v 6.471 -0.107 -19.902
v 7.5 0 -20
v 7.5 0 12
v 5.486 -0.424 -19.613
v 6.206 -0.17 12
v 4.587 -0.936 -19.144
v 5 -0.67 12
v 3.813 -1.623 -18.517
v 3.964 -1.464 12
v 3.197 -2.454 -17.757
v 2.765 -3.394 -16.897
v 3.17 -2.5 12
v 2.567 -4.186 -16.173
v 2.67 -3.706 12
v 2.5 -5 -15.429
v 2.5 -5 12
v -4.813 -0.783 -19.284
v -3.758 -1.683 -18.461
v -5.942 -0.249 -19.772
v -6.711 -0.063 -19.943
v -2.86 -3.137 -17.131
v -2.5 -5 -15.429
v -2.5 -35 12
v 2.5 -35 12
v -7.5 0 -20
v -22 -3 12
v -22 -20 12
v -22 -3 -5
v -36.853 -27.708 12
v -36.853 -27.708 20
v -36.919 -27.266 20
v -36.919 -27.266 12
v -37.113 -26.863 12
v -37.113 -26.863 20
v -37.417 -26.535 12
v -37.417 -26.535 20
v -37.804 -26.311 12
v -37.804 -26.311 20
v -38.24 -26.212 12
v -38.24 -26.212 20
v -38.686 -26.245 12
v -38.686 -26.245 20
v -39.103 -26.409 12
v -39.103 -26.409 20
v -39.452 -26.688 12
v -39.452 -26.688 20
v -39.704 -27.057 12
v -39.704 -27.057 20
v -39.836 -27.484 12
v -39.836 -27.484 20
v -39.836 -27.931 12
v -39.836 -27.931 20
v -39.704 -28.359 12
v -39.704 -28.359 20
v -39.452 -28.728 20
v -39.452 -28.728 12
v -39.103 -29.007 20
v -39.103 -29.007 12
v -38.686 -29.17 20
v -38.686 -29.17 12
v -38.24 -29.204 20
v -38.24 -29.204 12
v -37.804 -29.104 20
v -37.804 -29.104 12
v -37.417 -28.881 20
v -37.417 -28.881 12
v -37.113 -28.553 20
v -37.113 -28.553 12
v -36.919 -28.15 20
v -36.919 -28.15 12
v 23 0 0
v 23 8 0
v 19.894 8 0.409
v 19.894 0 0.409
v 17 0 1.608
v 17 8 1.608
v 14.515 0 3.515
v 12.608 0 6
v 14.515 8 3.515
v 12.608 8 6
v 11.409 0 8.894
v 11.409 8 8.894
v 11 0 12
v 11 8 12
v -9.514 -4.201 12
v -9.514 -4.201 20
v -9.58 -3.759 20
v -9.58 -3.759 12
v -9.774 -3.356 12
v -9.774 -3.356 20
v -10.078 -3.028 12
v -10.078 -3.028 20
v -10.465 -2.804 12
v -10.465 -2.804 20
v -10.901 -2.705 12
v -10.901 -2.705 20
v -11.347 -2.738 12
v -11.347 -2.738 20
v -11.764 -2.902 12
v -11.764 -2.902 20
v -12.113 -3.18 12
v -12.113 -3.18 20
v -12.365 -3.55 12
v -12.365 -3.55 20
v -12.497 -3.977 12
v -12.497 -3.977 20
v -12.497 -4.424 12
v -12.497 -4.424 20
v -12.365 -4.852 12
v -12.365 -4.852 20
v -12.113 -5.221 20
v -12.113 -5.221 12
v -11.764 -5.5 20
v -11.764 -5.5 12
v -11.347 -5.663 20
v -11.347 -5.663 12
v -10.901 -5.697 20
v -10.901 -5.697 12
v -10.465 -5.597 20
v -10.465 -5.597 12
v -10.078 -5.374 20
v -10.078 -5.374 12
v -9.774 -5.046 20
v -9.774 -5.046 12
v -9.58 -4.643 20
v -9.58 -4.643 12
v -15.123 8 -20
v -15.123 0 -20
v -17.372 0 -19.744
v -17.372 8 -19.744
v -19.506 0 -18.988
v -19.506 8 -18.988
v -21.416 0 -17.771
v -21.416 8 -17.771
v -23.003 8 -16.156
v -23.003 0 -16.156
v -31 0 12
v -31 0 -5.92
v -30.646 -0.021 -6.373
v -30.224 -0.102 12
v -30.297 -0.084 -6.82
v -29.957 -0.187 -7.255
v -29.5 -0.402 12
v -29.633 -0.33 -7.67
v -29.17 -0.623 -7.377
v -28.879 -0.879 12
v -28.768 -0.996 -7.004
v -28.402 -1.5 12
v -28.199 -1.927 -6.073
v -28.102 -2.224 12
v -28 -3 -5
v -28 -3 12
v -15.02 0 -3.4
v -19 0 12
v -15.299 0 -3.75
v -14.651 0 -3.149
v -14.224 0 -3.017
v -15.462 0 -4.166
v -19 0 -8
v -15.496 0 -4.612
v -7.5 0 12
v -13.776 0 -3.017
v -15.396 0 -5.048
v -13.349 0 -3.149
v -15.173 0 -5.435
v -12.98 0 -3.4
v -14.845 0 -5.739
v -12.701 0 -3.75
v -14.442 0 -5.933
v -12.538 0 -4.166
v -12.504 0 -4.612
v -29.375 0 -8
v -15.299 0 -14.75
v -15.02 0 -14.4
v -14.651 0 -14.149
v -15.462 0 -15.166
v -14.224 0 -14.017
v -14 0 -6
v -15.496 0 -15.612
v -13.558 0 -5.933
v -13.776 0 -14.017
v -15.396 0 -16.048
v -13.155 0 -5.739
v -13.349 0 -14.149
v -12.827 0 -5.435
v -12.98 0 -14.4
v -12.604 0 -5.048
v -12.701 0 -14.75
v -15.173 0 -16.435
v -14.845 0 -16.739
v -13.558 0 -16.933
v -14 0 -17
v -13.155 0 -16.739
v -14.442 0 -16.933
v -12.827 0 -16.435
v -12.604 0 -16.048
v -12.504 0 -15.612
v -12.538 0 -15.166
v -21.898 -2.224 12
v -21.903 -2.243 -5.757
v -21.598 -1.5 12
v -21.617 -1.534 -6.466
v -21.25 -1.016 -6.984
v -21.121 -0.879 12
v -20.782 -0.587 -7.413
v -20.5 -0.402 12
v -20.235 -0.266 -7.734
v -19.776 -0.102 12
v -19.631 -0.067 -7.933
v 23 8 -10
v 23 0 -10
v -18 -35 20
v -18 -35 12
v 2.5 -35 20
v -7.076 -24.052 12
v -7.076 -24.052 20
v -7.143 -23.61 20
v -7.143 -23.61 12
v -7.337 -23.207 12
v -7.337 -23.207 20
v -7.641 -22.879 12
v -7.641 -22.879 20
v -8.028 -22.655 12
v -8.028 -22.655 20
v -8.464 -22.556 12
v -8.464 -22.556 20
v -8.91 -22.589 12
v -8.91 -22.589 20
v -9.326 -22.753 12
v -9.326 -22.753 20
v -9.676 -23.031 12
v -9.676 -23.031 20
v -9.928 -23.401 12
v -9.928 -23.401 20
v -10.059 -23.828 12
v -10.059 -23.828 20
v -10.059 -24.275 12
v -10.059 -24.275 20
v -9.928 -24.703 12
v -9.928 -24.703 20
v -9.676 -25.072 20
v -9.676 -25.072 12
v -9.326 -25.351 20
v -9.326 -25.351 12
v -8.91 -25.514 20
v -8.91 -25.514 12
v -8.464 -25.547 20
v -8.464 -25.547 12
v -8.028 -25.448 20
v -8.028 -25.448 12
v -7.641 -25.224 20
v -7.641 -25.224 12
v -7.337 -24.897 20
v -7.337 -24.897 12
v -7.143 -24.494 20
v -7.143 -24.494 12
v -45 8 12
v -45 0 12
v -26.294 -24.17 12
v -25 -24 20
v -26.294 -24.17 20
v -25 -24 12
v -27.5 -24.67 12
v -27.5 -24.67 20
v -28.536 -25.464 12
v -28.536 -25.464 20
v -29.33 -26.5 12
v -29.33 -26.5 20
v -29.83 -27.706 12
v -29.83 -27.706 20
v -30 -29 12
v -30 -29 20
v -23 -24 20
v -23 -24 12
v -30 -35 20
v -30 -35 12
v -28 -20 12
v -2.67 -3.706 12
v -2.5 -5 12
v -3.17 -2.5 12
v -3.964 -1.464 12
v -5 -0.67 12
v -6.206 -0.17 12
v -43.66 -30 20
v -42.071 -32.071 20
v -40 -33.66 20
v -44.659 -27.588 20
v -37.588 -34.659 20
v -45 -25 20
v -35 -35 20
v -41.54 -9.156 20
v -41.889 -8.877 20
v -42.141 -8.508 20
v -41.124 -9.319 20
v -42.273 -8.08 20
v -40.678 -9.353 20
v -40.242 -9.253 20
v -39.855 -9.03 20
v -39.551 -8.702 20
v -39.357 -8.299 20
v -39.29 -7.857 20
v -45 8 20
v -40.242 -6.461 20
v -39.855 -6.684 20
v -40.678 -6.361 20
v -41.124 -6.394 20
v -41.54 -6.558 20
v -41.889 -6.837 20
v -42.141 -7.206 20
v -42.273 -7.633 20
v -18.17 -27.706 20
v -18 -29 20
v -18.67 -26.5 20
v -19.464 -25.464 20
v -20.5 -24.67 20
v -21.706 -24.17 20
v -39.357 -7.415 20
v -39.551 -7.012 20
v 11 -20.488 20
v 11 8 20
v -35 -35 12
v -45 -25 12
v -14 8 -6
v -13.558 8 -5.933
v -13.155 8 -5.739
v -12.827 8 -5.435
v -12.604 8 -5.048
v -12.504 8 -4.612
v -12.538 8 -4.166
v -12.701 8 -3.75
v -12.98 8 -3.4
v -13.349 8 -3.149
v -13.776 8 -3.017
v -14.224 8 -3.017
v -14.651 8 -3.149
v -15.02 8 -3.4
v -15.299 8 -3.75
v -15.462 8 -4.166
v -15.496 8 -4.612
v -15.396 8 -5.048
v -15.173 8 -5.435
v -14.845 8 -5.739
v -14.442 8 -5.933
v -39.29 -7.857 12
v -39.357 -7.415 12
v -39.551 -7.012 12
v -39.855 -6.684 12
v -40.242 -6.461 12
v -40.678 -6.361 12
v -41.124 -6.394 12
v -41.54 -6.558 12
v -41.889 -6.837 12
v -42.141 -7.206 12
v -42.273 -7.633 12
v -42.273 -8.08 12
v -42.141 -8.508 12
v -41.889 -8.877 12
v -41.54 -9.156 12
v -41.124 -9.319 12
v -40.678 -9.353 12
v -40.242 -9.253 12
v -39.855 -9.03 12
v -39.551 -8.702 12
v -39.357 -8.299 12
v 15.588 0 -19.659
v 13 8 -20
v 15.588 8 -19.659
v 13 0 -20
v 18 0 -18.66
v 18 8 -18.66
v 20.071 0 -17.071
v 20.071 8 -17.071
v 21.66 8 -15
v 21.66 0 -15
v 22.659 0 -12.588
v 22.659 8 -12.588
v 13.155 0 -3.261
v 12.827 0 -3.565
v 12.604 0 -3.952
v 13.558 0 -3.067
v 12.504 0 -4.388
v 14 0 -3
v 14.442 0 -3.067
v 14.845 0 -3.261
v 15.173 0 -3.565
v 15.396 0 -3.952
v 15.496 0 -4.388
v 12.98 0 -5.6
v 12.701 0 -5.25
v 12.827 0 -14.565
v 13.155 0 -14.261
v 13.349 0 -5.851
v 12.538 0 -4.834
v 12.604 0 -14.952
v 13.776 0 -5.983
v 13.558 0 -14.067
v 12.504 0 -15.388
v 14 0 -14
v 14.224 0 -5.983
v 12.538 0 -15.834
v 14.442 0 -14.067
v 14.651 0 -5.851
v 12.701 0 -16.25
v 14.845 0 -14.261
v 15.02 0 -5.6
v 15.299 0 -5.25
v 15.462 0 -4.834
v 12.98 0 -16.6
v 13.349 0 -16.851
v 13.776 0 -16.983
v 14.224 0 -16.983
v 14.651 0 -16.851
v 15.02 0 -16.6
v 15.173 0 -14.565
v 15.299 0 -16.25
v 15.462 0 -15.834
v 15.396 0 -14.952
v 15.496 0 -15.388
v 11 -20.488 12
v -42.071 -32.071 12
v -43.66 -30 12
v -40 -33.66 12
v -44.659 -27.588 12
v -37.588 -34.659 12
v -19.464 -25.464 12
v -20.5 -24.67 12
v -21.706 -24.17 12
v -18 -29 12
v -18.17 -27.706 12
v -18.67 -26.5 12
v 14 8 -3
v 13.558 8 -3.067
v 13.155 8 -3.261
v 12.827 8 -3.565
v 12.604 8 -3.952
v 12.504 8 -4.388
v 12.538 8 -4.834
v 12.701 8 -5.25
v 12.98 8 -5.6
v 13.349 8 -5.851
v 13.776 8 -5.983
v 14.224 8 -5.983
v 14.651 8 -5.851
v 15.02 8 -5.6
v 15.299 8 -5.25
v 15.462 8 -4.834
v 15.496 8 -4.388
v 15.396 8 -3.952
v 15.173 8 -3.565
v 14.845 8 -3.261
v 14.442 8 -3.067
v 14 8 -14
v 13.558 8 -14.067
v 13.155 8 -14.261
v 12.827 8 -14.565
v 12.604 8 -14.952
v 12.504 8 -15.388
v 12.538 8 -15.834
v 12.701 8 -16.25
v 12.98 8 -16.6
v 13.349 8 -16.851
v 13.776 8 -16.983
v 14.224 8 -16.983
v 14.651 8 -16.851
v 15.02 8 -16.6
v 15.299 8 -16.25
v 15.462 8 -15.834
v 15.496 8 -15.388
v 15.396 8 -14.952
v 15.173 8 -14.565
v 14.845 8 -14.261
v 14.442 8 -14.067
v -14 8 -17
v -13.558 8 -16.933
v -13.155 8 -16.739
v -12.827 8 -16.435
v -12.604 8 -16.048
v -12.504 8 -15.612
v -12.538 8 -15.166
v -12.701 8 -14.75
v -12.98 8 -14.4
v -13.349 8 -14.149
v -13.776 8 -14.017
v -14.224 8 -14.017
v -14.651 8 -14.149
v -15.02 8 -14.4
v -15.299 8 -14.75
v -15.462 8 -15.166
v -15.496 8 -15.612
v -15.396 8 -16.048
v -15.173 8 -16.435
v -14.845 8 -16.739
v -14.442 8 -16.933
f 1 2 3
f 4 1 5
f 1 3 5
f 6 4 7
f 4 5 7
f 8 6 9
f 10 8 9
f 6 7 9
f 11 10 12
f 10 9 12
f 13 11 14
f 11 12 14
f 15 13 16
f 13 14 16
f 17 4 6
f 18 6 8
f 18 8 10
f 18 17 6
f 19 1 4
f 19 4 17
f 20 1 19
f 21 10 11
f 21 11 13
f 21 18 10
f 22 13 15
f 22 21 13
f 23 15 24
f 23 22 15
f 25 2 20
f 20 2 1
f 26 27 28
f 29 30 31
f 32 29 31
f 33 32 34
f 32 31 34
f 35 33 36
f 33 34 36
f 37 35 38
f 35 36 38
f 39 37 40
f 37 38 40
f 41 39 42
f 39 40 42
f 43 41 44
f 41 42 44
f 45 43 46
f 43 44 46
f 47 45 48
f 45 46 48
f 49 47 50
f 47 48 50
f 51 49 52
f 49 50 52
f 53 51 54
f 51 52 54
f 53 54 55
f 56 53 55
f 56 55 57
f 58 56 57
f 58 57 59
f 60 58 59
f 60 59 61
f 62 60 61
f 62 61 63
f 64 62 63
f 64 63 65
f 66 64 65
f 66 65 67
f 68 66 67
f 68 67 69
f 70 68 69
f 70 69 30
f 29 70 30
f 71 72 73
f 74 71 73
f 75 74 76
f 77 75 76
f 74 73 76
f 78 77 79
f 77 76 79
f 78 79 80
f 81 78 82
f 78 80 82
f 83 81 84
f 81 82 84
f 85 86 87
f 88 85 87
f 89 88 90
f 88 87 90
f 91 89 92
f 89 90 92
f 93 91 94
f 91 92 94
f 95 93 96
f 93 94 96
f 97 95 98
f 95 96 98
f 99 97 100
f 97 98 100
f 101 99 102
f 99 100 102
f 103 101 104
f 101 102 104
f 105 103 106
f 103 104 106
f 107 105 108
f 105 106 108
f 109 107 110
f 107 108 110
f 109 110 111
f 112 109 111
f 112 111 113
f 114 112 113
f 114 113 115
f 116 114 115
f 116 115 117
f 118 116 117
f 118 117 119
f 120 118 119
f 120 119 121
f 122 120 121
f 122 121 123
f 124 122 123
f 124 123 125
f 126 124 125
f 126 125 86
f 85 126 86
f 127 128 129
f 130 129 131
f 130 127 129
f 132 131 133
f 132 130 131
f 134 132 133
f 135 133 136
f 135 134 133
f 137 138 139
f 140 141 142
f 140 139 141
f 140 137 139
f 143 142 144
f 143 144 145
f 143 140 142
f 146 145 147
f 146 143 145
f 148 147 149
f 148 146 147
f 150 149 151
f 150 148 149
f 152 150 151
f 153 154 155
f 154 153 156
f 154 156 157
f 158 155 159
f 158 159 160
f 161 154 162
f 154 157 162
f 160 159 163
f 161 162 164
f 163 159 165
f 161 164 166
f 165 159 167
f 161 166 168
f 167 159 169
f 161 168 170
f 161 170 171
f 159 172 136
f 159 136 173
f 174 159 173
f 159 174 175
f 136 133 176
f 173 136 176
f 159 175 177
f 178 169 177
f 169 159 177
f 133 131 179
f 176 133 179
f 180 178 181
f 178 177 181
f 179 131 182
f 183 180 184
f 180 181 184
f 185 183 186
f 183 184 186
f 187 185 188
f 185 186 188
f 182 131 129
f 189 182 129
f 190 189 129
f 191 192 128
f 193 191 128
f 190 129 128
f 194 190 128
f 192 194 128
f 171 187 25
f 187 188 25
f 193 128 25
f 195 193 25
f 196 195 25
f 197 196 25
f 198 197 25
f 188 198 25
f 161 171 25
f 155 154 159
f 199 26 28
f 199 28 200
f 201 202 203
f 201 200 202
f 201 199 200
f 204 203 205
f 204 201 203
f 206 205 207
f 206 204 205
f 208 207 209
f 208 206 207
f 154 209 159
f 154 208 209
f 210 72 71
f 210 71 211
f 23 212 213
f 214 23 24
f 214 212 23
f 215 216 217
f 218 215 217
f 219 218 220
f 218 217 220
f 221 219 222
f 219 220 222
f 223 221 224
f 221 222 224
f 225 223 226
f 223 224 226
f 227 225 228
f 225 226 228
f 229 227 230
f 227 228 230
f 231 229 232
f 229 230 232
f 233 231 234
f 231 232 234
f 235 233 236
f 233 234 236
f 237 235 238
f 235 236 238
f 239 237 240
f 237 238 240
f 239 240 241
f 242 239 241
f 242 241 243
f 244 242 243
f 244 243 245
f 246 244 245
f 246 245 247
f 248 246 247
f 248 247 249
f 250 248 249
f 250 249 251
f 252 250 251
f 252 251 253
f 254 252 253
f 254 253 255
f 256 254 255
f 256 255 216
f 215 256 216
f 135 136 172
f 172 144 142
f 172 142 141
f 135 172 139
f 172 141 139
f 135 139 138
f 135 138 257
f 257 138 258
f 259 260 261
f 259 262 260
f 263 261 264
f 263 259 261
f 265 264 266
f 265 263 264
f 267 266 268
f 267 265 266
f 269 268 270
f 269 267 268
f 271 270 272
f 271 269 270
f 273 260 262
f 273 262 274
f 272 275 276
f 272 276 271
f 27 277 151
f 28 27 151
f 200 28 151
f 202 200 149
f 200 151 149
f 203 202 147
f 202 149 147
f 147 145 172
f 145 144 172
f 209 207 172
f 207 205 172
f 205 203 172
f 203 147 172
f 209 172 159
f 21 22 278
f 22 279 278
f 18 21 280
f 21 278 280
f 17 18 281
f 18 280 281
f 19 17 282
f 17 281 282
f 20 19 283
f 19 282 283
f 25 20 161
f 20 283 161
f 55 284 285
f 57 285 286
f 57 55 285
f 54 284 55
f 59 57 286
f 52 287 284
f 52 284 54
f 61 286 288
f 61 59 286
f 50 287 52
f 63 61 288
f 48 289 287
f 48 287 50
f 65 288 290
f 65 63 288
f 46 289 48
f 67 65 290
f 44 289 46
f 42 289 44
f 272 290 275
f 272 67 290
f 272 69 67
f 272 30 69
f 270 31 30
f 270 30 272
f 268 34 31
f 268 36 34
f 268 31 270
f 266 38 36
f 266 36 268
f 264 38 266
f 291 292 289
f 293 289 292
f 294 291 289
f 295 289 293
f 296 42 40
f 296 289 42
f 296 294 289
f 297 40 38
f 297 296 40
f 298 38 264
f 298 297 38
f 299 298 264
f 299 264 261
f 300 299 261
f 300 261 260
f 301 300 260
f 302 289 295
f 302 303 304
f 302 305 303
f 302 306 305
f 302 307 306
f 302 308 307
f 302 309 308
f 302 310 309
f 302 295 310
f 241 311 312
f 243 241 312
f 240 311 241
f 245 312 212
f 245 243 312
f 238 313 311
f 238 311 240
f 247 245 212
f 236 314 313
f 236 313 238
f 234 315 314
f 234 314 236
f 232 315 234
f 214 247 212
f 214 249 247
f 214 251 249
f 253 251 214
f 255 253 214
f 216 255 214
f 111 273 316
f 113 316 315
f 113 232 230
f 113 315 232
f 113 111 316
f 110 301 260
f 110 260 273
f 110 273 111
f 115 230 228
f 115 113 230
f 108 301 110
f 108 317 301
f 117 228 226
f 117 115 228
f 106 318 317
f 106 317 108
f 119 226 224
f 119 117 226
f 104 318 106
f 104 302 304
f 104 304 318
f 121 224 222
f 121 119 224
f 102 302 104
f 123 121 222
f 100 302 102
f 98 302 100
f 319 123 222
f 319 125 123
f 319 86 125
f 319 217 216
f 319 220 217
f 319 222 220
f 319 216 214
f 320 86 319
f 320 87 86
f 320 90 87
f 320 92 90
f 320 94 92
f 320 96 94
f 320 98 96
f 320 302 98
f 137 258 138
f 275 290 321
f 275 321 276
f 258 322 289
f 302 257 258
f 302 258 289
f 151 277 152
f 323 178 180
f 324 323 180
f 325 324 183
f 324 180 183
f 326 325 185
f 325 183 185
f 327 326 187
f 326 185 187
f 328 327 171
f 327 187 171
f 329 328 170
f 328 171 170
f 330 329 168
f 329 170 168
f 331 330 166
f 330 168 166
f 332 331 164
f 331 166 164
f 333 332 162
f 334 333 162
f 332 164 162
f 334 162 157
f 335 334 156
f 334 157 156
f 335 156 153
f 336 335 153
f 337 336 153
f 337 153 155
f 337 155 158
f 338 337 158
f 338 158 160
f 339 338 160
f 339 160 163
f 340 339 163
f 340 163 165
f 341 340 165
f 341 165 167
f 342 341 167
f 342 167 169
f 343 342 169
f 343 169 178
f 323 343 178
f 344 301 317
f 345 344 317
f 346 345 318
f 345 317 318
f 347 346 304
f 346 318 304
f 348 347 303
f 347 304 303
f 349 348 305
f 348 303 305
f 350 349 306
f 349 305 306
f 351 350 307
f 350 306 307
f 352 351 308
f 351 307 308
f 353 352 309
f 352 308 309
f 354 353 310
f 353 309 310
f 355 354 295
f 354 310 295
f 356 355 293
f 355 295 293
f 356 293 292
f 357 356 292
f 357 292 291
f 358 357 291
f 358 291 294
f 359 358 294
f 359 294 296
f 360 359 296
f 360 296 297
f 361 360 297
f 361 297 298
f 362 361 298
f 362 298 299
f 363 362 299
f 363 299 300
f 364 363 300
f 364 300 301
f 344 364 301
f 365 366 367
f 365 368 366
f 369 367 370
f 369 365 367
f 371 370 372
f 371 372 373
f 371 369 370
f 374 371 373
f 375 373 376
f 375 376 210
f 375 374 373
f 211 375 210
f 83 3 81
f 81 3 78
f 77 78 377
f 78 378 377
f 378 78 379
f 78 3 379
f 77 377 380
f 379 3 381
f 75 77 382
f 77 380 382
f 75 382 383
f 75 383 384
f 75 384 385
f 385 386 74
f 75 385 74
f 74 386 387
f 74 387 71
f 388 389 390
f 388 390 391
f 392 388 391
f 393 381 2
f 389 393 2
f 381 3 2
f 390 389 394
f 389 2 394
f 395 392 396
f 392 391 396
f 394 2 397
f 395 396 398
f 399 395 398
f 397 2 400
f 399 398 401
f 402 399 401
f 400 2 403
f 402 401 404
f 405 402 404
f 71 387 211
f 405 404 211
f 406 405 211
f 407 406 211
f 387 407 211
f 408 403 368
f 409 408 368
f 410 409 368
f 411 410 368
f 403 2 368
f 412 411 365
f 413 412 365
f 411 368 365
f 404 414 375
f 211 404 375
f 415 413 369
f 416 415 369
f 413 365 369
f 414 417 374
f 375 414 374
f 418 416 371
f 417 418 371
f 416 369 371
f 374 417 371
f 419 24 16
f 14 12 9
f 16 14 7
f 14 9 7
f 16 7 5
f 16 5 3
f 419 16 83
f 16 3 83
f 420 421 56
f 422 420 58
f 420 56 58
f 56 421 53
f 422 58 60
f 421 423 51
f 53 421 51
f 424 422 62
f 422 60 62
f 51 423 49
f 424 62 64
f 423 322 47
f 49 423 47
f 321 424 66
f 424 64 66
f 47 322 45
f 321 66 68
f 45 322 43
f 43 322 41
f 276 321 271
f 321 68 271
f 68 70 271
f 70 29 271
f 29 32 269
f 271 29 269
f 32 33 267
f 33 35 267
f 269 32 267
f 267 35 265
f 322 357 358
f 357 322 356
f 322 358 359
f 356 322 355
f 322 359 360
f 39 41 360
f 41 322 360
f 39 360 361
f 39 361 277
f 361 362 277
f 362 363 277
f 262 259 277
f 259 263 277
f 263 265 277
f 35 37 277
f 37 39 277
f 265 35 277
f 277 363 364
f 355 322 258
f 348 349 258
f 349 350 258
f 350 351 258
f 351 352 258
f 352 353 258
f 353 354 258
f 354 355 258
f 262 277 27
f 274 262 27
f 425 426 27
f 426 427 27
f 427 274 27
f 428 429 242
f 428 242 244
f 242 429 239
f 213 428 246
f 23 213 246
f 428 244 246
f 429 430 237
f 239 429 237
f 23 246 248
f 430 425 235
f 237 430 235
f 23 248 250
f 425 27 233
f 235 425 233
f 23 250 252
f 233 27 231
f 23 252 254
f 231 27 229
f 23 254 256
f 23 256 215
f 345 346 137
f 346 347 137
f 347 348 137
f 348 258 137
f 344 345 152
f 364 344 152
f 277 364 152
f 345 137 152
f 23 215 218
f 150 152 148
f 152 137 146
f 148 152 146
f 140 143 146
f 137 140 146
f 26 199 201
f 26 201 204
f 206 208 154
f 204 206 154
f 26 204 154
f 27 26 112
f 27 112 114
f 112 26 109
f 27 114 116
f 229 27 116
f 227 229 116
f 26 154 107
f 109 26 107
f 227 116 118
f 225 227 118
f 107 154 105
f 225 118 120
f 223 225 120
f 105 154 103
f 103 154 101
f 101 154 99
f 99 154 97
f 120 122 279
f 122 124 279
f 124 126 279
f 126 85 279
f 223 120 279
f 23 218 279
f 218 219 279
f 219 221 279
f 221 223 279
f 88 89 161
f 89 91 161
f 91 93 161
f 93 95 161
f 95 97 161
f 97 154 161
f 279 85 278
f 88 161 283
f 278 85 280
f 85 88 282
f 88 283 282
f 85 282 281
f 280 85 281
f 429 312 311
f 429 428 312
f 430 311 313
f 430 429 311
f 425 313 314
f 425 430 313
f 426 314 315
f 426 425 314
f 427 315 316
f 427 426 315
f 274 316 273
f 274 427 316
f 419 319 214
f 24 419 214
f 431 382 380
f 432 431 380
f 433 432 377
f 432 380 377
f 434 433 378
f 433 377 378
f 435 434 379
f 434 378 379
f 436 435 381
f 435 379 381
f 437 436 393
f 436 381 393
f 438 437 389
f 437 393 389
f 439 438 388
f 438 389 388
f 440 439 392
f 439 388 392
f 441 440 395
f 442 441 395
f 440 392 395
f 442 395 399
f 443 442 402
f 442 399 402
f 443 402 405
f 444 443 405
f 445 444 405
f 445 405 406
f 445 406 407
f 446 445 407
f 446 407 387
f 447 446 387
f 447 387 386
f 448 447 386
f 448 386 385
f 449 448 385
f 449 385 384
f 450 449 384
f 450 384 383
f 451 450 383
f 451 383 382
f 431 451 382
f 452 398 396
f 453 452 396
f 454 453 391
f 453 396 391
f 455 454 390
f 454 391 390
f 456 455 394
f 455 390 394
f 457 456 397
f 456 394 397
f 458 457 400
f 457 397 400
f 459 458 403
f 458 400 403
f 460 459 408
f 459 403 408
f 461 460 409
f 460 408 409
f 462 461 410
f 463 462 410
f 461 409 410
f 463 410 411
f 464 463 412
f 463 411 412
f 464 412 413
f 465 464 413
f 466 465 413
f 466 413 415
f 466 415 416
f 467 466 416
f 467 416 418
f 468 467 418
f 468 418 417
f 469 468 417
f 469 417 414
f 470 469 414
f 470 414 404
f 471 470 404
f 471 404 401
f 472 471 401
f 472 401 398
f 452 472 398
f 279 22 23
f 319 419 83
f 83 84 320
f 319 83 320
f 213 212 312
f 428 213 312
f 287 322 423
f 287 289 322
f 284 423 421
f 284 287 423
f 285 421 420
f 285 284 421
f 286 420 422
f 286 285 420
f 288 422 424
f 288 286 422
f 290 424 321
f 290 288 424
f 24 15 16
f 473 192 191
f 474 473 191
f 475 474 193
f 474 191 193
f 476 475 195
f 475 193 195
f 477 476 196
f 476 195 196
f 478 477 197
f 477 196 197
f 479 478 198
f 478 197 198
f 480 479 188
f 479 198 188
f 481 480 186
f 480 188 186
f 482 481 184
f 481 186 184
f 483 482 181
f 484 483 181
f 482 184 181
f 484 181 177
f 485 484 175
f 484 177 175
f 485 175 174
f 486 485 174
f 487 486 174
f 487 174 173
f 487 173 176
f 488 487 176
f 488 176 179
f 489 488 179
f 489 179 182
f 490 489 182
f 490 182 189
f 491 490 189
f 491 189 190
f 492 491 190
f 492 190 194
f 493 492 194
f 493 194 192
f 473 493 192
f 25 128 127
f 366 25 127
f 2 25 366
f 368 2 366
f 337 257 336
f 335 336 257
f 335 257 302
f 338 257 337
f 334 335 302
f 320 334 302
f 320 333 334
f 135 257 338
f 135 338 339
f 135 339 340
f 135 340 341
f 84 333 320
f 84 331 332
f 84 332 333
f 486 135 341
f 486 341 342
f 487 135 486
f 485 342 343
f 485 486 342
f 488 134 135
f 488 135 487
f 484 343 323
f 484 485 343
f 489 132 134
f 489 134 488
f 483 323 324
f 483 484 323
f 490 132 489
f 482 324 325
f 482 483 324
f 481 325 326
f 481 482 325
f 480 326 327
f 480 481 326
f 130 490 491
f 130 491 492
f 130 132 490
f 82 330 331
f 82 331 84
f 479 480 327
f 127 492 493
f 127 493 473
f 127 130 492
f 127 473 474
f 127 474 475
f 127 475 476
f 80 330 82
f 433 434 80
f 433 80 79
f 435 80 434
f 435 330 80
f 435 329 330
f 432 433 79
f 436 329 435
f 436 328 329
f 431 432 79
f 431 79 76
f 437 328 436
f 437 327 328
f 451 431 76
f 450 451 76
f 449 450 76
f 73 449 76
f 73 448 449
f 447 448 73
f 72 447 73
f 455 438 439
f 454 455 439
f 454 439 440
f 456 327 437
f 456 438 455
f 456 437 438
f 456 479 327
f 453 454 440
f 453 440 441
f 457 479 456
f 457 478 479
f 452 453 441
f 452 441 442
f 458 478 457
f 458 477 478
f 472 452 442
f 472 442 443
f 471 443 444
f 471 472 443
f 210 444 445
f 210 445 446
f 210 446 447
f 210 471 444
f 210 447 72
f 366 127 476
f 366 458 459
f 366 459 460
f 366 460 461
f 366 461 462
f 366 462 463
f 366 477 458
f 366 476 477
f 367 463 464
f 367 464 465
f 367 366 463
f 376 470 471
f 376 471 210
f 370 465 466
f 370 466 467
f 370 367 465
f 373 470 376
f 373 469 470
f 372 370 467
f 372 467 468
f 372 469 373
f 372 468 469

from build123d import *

# Parameters (mm, degrees)
SKETCH_1_W                = 90
SKETCH_1_H                = 40
EXTRUDE_1_DEPTH           = 8
SKETCH_2_R                = 1.5
CUT_EXTRUDE_1_DEPTH       = 50.889878733
SKETCH_3_W                = 90
SKETCH_3_H                = 8
EXTRUDE_2_DEPTH           = 35
CUT_EXTRUDE_3_DEPTH       = 61.415229868
SKETCH_7_W                = 22
SKETCH_7_H                = 40
CUT_EXTRUDE_4_DEPTH       = 66.375836515
SKETCH_8_W                = 5
SKETCH_8_H                = 32
EXTRUDE_3_DEPTH           = 35
CUT_EXTRUDE_5_DEPTH       = 59.576872569
SKETCH_14_R               = 1.5
CUT_EXTRUDE_8_DEPTH       = 70.641941386
SKETCH_15_W               = 12
SKETCH_15_H               = 11
CUT_EXTRUDE_10_DEPTH      = 70.641941386
FILLET_2_R                = 5
FILLET_5_R                = 5
CUT_EXTRUDE_11_DEPTH      = 66.375836515
CUT_EXTRUDE_11_DEPTH_BACK = 66.375836515
FILLET_4_R                = 10
CUT_EXTRUDE_12_DEPTH      = 66.375836515
SKETCH_19_W               = 6
SKETCH_19_H               = 20
EXTRUDE_4_DEPTH           = 20
CUT_EXTRUDE_13_REACH      = 67.008
FILLET_6_R                = 3


with BuildPart() as part:
    # 草图1 → 凸台-拉伸1 (new body)
    with BuildSketch(Plane(origin=(0, 0, 0), x_dir=(1, 0, 0), z_dir=(0, 1, 0))):
        Rectangle(SKETCH_1_W, SKETCH_1_H)
    extrude(amount=EXTRUDE_1_DEPTH)

    # 草图2 → 切除-拉伸1 (cut, through all)
    with BuildSketch(Plane.XZ):
        with Locations(Location((-14, -4.5, 0), (0, 0, 270))):
            Circle(SKETCH_2_R)
        with Locations(Location((-14, -15.5, 0), (0, 0, 270))):
            Circle(SKETCH_2_R)
        with Locations(Location((14, -15.5, 0), (0, 0, 90))):
            Circle(SKETCH_2_R)
        with Locations(Location((14, -4.5, 0), (0, 0, 90))):
            Circle(SKETCH_2_R)
    extrude(amount=-CUT_EXTRUDE_1_DEPTH, mode=Mode.SUBTRACT)

    # 草图3 → 凸台-拉伸2 (add)
    with BuildSketch(Plane.XZ):
        with Locations((0, 16)):
            Rectangle(SKETCH_3_W, SKETCH_3_H)
    extrude(amount=EXTRUDE_2_DEPTH)

    # 草图6 → 切除-拉伸3 (cut, through all)
    with BuildSketch(Plane.XZ):
        Polygon((-45, 12), (-20, -20), (-45, -20), align=None)
    extrude(amount=-CUT_EXTRUDE_3_DEPTH, mode=Mode.SUBTRACT)

    # 草图7 → 切除-拉伸4 (cut, through all)
    with BuildSketch(Plane(origin=(0, 8, 0), x_dir=(1, 0, 0), z_dir=(0, 1, 0))):
        with Locations((34, 0)):
            Rectangle(SKETCH_7_W, SKETCH_7_H)
    extrude(amount=-CUT_EXTRUDE_4_DEPTH, mode=Mode.SUBTRACT)

    # 草图8 → 凸台-拉伸3 (add)
    with BuildSketch(Plane.XZ):
        with Locations((0, -4)):
            Rectangle(SKETCH_8_W, SKETCH_8_H)
    extrude(amount=EXTRUDE_3_DEPTH)

    # 草图9 → 切除-拉伸5 (cut, through all)
    with BuildSketch(Plane.ZY.offset(2.5)):
        Polygon((-20, 0), (12, -35), (-20, -35), align=None)
    extrude(amount=-CUT_EXTRUDE_5_DEPTH, mode=Mode.SUBTRACT)

    # 草图14 → 切除-拉伸8 (cut, through all)
    with BuildSketch(Plane.XY.offset(20)):
        with Locations((-8.576116211, -24.051679616)):
            Circle(SKETCH_14_R)
        with Locations((-38.352500761, -27.707759918)):
            Circle(SKETCH_14_R)
        with Locations((-40.789887629, -7.856836885)):
            Circle(SKETCH_14_R)
        with Locations((-11.013503079, -4.200756583)):
            Circle(SKETCH_14_R)
    extrude(amount=-CUT_EXTRUDE_8_DEPTH, mode=Mode.SUBTRACT)

    # 草图15 → 切除-拉伸10 (cut, through all)
    with BuildSketch(Plane.XY.offset(20)):
        with Locations((-24, -29.5)):
            Rectangle(SKETCH_15_W, SKETCH_15_H)
    extrude(amount=-CUT_EXTRUDE_10_DEPTH, mode=Mode.SUBTRACT)

    # 圆角2
    fillet_2_edges = [part.edges().sort_by_distance(p)[0] for p in [
        (-30, -24, 16),
        (-18, -24, 16),
    ]]
    fillet(fillet_2_edges, radius=FILLET_2_R)

    # 圆角5
    fillet_5_edges = [part.edges().sort_by_distance(p)[0] for p in [
        (2.5, 0, -4),
        (-2.5, 0, -4),
    ]]
    fillet(fillet_5_edges, radius=FILLET_5_R)

    # 草图16 → 切除-拉伸11 (cut, two sides: drawn at the far end of the back side and taken through both)
    with BuildSketch(Plane(origin=(0, 0, 12), x_dir=(-1, 0, 0), z_dir=(0, 0, -1)).offset(-CUT_EXTRUDE_11_DEPTH_BACK)):
        Polygon((-23, 0), (-2.5, -35), (-23, -35), align=None)
    extrude(amount=CUT_EXTRUDE_11_DEPTH + CUT_EXTRUDE_11_DEPTH_BACK, mode=Mode.SUBTRACT)

    # 圆角4
    fillet_4_edges = [part.edges().sort_by_distance(p)[0] for p in [
        (-45, -35, 16),
        (-20, 4, -20),
        (23, 4, -20),
    ]]
    fillet(fillet_4_edges, radius=FILLET_4_R)

    # 草图18 → 切除-拉伸12 (cut, through all)
    with BuildSketch(Plane(origin=(0, 8, 0), x_dir=(1, 0, 0), z_dir=(0, 1, 0))):
        with BuildLine():
            Line((11, -12), (11, -20))
            Line((11, -20), (23, -20))
            Line((23, -20), (23, -12))
            Line((23, -12), (23, 0))
            ThreePointArc((23, 0), (14.514718626, -3.514718626), (11, -12))
        make_face()
    extrude(amount=-CUT_EXTRUDE_12_DEPTH, mode=Mode.SUBTRACT)

    # 草图19 → 凸台-拉伸4 (add)
    with BuildSketch(Plane(origin=(0, 0, 12), x_dir=(-1, 0, 0), z_dir=(0, 0, -1))):
        with Locations((25, -10)):
            Rectangle(SKETCH_19_W, SKETCH_19_H)
    extrude(amount=EXTRUDE_4_DEPTH)

    # 草图20 → 切除-拉伸13 (cut, up to next)
    with BuildSketch(Plane.ZY.offset(28), mode=Mode.PRIVATE) as cut_extrude_13_sk1:
        Polygon((-8, 0), (12, -20), (-8, -20), align=None)
    cut_extrude_13_tool1 = extrude(cut_extrude_13_sk1.sketch, amount=-CUT_EXTRUDE_13_REACH, mode=Mode.PRIVATE) & part.part
    add(cut_extrude_13_tool1.solids().sort_by_distance((-28, -13.333333, -1.333333))[0], mode=Mode.SUBTRACT)

    # 圆角6
    # the kernel refuses this fillet: 3 mm, written as the material it adds along each edge
    with BuildSketch(Plane(origin=(-22, 0, 19.5), x_dir=(1, 0, 0), z_dir=(0, 0, -1))) as fillet_6_piece_1_section:
        with BuildLine():
            CenterArc((FILLET_6_R, FILLET_6_R), FILLET_6_R, 180, 90)
            Line((0, FILLET_6_R), (0, 0))
            Line((0, 0), (FILLET_6_R, 0))
        make_face()
    fillet_6_piece_1 = extrude(amount=35, mode=Mode.PRIVATE)
    fillet_6_piece_1 = split(fillet_6_piece_1, bisect_by=Plane(origin=(-21.320814657, -12.214592671, 4.214592671), z_dir=(0, 0.7071067811865476, 0.7071067811865476)), keep=Keep.TOP, mode=Mode.PRIVATE)
    add(fillet_6_piece_1)
    with BuildSketch(Plane(origin=(-28, 0, 19.5), x_dir=(-1, 0, 0), z_dir=(0, 0, -1))) as fillet_6_piece_2_section:
        with BuildLine():
            CenterArc((FILLET_6_R, -FILLET_6_R), FILLET_6_R, 90, 90)
            Line((0, -FILLET_6_R), (0, 0))
            Line((0, 0), (FILLET_6_R, 0))
        make_face()
    fillet_6_piece_2 = extrude(amount=35, mode=Mode.PRIVATE)
    fillet_6_piece_2 = split(fillet_6_piece_2, bisect_by=Plane(origin=(-28.679185343, -12.214592671, 4.214592671), z_dir=(0, 0.7071067811865476, 0.7071067811865476)), keep=Keep.TOP, mode=Mode.PRIVATE)
    fillet_6_piece_2 = split(fillet_6_piece_2, bisect_by=Plane(origin=(-40.633408635, -0.679185343, 6.410763053), z_dir=(0.7880243737245634, 0, 0.6156440419723153)), keep=Keep.TOP, mode=Mode.PRIVATE)
    add(fillet_6_piece_2)


solid = part.part
